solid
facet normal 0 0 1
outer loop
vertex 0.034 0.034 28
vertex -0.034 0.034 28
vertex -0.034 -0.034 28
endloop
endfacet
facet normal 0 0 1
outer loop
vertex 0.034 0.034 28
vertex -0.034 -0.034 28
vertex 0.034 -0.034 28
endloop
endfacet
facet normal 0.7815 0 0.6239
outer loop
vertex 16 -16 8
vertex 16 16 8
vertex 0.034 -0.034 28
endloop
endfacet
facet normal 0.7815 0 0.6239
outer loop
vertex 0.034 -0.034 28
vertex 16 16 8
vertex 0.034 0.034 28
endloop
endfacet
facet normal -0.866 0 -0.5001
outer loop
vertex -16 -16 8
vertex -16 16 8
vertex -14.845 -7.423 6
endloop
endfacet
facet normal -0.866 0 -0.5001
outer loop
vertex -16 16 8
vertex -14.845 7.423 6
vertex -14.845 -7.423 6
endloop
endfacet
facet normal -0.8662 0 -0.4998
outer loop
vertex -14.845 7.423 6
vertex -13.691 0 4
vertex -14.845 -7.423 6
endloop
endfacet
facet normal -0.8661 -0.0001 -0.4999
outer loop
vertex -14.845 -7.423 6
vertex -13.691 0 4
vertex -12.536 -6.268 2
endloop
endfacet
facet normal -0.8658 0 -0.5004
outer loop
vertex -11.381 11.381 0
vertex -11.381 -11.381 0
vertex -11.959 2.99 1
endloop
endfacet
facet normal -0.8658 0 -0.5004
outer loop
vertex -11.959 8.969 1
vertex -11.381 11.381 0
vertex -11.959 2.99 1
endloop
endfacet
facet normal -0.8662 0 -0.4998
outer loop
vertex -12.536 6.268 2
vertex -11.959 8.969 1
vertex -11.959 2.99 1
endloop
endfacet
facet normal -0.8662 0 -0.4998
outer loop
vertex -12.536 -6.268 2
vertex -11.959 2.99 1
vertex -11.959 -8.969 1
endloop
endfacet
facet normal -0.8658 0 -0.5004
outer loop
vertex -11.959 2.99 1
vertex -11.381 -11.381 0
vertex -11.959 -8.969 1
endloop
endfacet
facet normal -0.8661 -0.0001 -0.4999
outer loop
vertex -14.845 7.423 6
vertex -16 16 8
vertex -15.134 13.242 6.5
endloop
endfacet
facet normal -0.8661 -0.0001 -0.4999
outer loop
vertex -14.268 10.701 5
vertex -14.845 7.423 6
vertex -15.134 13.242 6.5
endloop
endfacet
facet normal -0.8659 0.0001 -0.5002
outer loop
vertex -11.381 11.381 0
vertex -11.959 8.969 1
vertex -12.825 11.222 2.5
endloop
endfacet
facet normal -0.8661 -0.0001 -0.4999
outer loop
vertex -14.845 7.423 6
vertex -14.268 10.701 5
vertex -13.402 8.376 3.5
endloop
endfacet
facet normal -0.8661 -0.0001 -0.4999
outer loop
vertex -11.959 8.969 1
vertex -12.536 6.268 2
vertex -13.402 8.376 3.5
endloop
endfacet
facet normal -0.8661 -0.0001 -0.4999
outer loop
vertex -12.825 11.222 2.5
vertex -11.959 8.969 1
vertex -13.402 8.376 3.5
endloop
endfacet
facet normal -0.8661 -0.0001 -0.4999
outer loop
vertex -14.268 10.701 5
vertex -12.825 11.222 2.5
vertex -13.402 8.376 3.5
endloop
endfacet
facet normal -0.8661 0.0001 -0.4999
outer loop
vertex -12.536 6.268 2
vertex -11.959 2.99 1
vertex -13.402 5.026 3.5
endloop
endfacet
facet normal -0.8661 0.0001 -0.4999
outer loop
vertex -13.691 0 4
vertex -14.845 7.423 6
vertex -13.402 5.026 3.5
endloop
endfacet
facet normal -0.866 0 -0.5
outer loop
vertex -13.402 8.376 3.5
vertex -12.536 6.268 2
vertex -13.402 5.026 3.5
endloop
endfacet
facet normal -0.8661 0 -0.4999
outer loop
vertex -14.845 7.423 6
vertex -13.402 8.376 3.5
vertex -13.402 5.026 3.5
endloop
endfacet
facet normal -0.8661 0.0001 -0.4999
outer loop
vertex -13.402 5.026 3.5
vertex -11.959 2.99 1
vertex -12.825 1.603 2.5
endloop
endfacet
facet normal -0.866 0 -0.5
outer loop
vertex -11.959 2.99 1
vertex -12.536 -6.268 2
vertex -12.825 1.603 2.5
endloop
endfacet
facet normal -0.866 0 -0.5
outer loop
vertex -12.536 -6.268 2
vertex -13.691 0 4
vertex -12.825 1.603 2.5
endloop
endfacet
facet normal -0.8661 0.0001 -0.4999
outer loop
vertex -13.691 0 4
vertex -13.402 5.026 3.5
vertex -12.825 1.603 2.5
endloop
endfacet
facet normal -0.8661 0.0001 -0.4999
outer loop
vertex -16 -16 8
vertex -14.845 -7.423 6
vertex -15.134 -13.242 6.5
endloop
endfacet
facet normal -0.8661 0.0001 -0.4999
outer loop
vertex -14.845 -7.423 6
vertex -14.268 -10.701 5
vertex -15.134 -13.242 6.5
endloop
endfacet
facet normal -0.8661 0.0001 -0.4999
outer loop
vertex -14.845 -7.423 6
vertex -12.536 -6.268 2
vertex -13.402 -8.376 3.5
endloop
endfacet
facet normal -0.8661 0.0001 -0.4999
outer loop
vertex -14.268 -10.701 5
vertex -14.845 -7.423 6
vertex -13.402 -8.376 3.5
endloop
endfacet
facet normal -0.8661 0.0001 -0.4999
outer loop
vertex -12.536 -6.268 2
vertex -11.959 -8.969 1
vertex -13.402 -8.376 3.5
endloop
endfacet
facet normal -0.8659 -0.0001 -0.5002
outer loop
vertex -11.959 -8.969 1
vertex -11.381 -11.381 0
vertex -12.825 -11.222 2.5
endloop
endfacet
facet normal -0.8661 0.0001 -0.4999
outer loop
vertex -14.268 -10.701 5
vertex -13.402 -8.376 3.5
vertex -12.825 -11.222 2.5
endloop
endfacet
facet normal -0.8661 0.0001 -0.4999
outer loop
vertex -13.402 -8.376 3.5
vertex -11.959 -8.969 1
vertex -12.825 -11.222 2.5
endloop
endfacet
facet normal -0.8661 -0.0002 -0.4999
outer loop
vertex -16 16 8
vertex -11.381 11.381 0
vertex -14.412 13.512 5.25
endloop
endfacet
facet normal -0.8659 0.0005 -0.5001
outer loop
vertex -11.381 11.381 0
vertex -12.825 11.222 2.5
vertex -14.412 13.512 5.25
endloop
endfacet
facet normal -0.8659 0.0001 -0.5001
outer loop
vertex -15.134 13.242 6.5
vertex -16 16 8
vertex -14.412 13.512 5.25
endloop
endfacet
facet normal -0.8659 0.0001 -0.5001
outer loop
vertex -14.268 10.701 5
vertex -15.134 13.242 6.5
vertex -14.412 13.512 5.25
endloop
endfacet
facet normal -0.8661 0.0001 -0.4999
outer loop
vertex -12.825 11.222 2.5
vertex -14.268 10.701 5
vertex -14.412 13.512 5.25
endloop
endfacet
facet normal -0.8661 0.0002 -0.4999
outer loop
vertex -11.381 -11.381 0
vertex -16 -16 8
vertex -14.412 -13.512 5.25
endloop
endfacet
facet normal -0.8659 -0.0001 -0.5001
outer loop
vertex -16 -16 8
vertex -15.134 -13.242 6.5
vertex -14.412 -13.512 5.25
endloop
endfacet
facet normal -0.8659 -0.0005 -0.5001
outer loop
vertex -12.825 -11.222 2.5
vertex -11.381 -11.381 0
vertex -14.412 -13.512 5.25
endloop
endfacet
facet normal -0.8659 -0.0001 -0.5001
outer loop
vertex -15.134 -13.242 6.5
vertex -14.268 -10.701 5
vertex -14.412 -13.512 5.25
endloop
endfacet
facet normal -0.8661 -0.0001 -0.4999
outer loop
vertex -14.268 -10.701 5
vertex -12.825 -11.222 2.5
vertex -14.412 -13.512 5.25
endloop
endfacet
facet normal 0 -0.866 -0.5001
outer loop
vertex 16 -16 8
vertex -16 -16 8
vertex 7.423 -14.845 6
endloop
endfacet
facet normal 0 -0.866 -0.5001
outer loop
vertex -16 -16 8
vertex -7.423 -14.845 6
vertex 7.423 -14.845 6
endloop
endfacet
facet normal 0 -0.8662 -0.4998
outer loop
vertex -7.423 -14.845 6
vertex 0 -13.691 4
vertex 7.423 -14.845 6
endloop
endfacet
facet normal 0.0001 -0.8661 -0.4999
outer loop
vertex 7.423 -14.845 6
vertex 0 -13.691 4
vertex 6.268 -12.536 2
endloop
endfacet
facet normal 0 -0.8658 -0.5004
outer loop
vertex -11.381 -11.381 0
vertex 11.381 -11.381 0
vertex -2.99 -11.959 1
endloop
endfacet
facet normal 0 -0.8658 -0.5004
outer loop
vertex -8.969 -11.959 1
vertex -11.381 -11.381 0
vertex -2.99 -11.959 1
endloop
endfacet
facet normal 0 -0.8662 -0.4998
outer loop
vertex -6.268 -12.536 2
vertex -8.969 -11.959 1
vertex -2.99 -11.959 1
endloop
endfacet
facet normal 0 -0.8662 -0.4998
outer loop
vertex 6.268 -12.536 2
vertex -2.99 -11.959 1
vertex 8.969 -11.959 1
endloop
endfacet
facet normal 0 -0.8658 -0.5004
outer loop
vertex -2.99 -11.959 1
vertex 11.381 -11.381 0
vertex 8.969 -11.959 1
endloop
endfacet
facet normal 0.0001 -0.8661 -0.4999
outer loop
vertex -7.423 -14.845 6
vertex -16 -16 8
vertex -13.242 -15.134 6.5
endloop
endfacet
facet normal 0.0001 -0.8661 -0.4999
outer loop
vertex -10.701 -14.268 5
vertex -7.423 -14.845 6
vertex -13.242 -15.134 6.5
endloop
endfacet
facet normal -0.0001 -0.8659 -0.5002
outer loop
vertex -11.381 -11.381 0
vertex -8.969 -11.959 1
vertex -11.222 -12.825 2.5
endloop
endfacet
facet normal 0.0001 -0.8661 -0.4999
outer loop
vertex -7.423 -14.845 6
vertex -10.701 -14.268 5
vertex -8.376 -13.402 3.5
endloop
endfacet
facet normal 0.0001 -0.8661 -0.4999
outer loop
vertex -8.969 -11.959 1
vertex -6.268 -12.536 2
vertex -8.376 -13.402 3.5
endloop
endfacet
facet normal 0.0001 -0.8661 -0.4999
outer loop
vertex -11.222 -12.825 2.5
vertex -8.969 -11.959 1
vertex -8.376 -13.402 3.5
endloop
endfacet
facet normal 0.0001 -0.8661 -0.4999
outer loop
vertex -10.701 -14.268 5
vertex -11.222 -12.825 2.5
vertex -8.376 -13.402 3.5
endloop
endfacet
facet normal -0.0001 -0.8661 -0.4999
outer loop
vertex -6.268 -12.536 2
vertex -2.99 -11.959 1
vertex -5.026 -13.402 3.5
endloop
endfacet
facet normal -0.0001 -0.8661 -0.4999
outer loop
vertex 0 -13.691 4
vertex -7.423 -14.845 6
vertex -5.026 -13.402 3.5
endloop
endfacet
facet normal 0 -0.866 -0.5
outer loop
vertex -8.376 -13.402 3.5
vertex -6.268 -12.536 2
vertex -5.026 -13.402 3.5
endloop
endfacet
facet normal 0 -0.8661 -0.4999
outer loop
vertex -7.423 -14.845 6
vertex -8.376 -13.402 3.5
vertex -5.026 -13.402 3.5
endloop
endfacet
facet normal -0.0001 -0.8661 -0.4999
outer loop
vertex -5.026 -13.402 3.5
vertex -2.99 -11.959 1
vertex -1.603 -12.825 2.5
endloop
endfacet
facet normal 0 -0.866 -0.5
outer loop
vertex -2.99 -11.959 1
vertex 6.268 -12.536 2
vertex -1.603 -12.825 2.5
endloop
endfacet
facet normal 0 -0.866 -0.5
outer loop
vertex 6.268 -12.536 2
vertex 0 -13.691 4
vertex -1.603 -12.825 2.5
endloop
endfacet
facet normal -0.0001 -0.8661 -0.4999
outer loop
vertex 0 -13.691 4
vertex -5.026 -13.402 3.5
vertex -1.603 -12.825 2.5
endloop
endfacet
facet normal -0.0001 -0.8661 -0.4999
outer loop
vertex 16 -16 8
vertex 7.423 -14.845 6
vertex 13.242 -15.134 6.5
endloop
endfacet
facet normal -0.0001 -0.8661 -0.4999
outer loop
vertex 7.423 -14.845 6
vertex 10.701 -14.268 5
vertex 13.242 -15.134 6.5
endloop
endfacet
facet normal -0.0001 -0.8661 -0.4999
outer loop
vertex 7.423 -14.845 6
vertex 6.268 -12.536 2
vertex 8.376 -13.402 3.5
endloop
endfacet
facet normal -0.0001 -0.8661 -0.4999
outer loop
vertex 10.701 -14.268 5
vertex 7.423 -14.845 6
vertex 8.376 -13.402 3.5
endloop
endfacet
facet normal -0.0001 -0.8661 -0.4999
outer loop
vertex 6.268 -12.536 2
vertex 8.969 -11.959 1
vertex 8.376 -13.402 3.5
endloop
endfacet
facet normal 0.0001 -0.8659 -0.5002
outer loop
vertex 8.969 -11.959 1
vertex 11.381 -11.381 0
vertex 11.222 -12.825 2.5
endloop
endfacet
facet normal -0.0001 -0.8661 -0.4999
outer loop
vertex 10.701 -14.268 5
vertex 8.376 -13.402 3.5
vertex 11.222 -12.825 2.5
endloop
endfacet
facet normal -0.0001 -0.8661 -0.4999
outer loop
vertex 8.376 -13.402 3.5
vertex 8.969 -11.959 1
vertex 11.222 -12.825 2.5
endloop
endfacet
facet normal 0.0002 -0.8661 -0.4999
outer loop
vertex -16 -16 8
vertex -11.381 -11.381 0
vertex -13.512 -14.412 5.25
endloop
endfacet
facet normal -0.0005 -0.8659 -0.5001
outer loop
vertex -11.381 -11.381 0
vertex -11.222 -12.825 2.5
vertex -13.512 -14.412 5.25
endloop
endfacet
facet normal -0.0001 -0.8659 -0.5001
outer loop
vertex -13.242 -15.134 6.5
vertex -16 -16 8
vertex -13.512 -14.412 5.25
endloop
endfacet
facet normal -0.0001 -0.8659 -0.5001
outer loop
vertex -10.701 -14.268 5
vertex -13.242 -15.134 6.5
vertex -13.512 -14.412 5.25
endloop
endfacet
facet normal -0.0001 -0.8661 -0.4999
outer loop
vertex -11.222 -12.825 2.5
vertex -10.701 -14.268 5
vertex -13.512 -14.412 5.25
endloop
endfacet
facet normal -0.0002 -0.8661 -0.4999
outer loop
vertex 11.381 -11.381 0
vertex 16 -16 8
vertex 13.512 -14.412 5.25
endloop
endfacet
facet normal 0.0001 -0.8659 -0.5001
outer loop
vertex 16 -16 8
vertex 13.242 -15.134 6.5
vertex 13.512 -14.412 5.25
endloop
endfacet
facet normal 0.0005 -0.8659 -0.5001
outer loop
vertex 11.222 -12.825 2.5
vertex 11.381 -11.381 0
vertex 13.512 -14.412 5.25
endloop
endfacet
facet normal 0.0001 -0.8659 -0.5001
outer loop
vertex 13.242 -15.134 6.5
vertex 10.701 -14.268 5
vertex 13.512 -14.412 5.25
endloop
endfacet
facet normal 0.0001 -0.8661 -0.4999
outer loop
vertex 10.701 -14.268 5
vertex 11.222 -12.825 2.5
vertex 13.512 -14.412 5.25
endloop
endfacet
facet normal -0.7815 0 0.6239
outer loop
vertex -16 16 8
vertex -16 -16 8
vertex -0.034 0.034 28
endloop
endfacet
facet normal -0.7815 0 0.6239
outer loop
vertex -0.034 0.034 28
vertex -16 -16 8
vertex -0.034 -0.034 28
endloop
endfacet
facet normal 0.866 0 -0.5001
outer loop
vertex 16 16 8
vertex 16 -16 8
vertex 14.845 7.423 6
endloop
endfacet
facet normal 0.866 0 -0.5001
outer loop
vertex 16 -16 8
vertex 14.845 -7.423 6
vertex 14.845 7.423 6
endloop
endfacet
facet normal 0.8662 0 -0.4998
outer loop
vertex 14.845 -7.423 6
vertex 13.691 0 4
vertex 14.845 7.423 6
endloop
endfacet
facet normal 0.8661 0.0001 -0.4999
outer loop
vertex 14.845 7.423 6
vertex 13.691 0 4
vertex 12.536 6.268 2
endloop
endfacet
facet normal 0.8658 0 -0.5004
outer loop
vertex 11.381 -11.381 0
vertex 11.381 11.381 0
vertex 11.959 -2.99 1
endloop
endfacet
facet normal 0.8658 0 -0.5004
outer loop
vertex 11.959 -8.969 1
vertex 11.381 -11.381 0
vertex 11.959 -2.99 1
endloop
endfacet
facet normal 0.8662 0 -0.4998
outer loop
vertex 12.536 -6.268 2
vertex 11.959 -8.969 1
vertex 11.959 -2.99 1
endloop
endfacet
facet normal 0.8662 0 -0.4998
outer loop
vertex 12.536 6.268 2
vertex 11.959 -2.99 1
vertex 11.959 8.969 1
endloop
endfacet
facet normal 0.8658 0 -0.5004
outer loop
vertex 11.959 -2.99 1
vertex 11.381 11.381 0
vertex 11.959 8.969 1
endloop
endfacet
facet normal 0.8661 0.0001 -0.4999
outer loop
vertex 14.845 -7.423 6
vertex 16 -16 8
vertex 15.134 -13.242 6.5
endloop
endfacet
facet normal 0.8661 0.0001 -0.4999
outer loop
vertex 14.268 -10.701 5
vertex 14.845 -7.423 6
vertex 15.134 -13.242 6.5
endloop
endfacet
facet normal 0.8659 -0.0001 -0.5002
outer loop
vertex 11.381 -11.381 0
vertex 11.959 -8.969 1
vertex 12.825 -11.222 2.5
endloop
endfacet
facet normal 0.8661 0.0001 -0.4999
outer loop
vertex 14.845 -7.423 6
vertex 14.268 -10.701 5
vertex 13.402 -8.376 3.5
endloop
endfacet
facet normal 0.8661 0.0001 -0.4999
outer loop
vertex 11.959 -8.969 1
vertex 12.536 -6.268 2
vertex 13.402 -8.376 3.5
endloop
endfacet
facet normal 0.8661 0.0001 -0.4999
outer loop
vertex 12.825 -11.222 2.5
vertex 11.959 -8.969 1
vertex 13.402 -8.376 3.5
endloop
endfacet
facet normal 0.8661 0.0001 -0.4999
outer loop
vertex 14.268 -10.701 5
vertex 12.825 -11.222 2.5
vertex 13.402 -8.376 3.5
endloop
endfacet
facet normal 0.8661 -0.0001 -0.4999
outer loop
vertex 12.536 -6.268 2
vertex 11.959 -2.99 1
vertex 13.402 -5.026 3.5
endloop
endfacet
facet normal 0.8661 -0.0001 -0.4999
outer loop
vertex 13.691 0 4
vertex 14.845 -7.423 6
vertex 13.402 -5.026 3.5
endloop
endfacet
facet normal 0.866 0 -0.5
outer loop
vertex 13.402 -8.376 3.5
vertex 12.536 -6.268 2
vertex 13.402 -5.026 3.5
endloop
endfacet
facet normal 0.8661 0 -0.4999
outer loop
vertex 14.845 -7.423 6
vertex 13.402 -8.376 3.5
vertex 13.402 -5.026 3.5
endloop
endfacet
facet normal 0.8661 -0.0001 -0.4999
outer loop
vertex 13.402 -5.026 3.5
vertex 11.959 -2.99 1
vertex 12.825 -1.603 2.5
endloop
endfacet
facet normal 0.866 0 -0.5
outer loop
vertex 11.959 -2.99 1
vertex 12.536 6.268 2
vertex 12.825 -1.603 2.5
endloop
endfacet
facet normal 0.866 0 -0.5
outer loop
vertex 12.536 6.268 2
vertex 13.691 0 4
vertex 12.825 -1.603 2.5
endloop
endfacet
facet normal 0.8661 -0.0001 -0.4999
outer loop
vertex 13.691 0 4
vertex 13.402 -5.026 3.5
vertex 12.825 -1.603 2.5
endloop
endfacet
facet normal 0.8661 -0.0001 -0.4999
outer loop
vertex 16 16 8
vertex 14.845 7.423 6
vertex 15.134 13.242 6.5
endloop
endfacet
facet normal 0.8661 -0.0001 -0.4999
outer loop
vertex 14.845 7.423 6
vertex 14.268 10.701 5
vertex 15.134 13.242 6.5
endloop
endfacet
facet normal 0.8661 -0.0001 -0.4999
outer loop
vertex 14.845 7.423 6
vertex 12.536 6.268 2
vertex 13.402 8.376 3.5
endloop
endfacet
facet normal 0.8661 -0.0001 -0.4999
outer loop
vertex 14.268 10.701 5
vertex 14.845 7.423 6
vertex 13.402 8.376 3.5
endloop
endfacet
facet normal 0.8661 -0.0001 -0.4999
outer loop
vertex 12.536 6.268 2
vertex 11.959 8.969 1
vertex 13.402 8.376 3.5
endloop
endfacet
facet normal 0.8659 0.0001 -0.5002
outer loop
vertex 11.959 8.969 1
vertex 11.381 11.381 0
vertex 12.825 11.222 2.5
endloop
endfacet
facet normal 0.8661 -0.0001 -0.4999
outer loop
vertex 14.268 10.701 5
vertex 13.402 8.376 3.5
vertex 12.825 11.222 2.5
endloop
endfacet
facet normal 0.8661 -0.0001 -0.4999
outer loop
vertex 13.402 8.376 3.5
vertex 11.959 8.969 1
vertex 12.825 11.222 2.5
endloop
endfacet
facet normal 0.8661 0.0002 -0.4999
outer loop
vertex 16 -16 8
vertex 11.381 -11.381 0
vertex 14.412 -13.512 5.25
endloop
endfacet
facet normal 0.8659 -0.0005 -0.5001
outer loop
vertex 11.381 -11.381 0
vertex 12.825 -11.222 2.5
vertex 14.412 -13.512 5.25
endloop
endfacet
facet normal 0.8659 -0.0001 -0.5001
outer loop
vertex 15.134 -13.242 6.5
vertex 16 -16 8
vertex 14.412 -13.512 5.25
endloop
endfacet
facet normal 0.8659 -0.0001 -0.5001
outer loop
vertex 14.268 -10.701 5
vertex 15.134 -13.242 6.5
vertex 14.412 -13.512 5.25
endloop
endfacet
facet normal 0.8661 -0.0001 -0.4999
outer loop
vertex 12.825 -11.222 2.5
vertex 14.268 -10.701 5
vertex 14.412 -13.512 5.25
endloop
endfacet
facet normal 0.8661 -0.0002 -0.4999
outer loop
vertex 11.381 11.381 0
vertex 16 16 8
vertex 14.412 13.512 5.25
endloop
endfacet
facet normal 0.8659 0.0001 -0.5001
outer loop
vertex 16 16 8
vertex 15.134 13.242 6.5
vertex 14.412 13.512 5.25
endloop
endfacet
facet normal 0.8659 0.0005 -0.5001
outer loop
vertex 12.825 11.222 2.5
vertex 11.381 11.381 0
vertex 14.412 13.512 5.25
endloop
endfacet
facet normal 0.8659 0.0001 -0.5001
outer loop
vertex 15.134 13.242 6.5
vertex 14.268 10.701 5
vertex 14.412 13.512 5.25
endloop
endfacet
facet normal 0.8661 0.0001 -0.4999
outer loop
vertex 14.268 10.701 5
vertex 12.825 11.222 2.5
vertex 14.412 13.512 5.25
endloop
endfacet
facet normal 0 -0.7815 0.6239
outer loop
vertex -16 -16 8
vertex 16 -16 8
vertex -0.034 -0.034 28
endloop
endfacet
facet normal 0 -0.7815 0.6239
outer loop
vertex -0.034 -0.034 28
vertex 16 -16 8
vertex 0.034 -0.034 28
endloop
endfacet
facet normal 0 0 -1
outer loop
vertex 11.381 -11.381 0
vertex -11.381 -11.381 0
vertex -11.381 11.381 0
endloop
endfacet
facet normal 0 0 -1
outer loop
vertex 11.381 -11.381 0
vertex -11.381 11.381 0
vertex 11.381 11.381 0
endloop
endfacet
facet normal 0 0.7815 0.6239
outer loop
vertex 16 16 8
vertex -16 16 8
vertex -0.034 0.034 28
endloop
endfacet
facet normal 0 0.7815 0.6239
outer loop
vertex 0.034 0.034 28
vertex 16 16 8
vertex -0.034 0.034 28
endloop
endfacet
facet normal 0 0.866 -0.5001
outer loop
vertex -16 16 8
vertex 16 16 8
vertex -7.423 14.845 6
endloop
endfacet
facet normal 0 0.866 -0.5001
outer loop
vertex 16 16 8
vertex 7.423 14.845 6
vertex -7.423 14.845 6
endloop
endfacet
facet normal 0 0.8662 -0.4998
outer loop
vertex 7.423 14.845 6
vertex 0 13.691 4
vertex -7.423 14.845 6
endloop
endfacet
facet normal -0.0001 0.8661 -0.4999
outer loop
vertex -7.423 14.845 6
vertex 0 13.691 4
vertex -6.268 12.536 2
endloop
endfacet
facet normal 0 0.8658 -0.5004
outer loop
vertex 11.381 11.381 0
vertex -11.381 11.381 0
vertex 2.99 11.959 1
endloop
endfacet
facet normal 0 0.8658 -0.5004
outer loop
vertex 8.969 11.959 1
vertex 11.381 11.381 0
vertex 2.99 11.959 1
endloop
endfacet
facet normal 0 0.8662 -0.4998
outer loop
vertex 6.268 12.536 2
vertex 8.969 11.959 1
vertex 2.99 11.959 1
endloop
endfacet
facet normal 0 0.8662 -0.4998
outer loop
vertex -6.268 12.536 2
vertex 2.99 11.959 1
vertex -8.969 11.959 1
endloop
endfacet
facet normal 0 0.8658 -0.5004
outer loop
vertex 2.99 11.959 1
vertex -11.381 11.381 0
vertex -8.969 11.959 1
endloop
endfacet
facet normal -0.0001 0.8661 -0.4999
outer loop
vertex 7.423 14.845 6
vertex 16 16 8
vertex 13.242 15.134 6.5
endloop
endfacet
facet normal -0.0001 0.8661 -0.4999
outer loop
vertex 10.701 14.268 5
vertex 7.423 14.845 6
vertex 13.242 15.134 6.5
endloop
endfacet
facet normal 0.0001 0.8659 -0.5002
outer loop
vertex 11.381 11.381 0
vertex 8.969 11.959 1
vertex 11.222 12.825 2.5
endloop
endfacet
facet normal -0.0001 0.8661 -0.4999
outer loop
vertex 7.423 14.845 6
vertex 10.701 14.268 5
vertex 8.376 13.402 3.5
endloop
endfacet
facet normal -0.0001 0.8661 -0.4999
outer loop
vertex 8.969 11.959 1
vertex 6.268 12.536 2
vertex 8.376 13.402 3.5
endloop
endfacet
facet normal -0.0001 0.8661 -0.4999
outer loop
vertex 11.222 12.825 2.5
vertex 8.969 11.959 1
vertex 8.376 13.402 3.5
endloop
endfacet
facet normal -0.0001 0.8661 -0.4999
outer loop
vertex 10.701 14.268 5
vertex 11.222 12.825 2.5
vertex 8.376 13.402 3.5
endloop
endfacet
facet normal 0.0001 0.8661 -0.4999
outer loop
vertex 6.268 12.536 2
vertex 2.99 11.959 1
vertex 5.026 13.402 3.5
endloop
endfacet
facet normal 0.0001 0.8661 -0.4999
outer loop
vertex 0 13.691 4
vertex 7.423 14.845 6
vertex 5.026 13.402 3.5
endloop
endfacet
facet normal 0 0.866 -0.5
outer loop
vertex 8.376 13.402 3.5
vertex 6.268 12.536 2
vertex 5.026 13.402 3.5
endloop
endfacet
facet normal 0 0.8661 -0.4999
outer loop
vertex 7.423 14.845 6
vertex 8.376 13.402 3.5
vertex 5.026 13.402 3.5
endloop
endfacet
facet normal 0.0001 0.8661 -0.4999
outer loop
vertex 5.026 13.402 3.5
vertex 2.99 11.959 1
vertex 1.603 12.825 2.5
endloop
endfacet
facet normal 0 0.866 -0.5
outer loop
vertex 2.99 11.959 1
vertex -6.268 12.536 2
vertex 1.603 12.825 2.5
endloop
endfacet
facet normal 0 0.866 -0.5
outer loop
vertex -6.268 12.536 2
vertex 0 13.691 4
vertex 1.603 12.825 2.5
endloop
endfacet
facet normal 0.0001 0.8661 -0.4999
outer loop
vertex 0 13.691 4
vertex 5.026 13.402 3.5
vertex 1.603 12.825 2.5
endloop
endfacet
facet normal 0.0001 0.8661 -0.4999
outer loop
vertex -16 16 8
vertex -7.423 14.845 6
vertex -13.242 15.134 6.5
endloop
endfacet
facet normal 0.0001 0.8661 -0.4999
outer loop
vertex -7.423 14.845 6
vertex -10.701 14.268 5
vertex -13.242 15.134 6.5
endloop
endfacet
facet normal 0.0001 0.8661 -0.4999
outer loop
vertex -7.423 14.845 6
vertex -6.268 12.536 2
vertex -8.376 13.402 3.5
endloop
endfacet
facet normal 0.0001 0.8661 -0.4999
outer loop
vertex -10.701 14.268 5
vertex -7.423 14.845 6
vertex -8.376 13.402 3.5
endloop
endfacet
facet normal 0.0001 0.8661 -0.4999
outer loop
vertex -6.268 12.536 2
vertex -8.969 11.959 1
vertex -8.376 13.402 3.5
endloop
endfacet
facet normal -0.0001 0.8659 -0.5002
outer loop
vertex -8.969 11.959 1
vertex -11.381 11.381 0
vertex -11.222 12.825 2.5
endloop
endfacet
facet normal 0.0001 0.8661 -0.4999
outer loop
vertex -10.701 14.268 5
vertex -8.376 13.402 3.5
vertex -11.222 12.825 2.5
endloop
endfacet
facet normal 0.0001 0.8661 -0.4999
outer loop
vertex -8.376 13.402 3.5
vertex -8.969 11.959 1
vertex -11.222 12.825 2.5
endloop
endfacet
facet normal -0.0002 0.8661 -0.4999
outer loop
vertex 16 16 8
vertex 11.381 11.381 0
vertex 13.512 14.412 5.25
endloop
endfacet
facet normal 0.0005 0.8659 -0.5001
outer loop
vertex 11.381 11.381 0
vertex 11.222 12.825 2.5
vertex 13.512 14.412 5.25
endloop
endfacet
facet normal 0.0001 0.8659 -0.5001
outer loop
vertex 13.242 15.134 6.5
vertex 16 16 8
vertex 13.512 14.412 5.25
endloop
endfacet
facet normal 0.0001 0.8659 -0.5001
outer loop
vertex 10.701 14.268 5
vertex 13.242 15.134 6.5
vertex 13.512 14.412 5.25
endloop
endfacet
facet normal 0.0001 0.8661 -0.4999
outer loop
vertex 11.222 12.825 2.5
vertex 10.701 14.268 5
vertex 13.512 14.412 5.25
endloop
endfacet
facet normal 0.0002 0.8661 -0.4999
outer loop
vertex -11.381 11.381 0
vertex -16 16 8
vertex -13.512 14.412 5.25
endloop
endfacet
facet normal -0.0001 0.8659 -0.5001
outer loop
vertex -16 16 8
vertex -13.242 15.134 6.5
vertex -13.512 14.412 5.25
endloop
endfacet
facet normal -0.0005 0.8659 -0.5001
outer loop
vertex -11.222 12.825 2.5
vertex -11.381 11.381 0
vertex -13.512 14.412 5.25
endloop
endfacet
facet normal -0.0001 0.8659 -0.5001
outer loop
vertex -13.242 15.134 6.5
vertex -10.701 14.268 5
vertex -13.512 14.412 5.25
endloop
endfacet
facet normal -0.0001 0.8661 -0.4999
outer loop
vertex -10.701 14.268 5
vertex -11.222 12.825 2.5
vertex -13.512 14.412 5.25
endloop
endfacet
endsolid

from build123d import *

# Parameters (mm, degrees)
F2_W          = 32
F2_H          = 32
F3_DEPTH      = 20
F3_TAPER      = 38.6
F3_DEPTH_BACK = 8
F3_TAPER_BACK = 30


with BuildPart() as f3:
    # F2 (on plane+point) → F3 (new body, two sides)
    with BuildSketch(Plane.XY.offset(8)) as f3_sk:
        Rectangle(F2_W, F2_H)
    extrude(amount=F3_DEPTH, taper=F3_TAPER)
    extrude(f3_sk.sketch, amount=-F3_DEPTH_BACK, taper=F3_TAPER_BACK)


solid = f3.part
